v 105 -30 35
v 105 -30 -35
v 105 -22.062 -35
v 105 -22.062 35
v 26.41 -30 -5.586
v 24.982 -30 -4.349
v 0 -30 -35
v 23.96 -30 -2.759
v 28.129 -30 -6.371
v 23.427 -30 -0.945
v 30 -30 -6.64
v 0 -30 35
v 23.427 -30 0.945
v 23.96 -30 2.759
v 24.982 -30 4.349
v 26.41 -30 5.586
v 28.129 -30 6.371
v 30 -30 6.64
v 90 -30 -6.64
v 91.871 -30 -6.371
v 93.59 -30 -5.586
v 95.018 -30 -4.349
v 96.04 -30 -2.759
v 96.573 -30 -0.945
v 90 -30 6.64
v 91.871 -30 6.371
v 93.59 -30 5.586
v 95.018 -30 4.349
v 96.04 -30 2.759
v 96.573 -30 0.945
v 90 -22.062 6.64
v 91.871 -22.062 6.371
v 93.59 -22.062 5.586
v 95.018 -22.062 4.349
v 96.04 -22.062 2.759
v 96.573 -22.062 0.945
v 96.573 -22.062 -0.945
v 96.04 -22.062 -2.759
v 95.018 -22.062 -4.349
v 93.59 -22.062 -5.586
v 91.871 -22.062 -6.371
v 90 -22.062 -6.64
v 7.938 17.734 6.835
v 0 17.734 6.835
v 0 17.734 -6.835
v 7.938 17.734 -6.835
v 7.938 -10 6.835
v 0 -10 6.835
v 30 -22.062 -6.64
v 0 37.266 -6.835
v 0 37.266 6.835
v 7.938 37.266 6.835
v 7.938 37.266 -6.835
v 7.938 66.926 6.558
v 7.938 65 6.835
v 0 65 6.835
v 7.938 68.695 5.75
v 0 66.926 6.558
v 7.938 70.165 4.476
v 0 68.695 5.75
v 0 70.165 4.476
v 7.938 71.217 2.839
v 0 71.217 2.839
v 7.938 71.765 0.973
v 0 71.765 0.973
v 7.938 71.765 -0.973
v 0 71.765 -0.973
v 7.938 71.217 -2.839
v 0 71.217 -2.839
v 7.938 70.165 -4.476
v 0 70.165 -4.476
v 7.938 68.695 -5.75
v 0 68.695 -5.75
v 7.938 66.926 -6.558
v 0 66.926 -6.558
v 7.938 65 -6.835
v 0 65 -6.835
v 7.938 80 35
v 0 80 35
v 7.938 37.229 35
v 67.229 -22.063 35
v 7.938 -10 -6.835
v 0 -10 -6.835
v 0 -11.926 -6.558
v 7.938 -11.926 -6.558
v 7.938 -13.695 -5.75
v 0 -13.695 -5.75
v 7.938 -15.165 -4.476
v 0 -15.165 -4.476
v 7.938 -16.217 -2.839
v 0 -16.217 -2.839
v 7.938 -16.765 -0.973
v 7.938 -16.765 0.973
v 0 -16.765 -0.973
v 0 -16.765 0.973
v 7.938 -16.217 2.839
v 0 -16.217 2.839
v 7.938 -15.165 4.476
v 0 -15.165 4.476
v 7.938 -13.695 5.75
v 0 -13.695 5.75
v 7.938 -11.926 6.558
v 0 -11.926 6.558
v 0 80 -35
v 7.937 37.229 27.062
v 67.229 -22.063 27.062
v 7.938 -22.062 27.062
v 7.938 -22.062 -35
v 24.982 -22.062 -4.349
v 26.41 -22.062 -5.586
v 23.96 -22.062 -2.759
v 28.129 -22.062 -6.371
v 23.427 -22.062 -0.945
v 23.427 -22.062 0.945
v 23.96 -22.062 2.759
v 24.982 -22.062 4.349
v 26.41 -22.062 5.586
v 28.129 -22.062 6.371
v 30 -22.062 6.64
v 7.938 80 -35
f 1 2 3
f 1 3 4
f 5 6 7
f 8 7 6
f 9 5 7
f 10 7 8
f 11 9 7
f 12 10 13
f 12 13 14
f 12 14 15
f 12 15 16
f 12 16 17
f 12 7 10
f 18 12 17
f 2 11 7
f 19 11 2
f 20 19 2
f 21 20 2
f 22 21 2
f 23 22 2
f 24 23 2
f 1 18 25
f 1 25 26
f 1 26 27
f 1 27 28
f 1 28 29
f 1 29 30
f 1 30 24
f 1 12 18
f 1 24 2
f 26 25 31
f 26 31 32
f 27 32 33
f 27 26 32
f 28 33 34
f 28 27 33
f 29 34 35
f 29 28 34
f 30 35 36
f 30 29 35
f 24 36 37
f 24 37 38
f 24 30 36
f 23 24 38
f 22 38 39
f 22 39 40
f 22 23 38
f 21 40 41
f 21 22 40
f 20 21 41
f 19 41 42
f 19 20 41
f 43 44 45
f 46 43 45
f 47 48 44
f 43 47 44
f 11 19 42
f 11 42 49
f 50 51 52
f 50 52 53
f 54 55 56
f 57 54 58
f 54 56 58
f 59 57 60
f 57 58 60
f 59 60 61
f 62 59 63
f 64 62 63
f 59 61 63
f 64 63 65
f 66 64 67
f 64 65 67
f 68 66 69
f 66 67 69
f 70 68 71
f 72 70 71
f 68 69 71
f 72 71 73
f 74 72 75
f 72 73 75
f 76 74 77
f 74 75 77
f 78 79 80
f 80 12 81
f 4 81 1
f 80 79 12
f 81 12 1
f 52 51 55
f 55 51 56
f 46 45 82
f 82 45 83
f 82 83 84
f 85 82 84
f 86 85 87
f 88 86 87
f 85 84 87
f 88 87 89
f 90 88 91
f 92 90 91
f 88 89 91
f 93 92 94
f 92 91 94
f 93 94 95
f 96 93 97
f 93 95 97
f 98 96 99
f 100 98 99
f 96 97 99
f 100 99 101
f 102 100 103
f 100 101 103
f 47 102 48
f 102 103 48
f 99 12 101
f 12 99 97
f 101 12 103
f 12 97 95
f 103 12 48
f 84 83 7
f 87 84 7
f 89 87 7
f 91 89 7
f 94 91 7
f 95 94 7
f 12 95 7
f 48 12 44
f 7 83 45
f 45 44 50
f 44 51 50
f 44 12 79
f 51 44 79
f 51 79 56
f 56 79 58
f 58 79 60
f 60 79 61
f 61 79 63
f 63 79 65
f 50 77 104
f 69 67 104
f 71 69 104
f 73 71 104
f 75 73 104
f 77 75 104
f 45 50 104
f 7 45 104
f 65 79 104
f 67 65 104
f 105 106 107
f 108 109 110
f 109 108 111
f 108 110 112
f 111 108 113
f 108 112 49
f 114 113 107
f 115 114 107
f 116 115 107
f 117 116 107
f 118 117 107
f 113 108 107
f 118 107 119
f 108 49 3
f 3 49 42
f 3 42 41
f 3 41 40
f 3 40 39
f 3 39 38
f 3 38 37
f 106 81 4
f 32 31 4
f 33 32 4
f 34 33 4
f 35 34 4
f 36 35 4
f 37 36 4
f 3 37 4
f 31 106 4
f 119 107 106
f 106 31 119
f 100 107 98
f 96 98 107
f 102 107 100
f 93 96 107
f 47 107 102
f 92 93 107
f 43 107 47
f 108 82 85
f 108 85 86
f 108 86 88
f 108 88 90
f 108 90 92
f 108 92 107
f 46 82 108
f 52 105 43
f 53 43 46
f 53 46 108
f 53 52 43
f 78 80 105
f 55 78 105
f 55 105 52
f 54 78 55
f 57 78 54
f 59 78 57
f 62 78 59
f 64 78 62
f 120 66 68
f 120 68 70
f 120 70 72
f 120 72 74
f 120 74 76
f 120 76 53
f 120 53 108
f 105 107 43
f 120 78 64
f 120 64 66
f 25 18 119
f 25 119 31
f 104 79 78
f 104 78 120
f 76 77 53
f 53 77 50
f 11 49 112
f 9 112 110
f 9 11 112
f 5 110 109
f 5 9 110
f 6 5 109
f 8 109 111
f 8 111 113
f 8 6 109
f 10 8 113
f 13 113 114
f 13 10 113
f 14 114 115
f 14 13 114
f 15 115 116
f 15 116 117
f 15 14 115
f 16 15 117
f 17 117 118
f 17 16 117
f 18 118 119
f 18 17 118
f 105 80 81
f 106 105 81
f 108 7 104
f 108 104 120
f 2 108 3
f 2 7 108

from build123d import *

# Parameters (mm, degrees)
CROQUIS1_W              = 70
CROQUIS1_H              = 110
CROQUIS1_W_2            = 13.66965824
CROQUIS1_H_2            = 19.532598364
SALIENTE_EXTRUIR1_DEPTH = 7.9375
CROQUIS2_W              = 97.0625
CROQUIS2_H              = 70
SALIENTE_EXTRUIR2_DEPTH = 7.9375
SALIENTE_EXTRUIR3_DEPTH = 7.9375


with BuildPart() as part:
    # Croquis1 → Saliente-Extruir1 (new body)
    # profile 1 of 2: a face of its own
    with BuildSketch(Plane(origin=(0, 0, 0), x_dir=(0, 0, -1), z_dir=(1, 0, 0))):
        with Locations((0, 25)):
            Rectangle(CROQUIS1_W, CROQUIS1_H)
        with BuildLine():
            Line((6.83482912, 65), (6.83482912, -10))
            ThreePointArc((6.83482912, -10), (0, -16.83482912), (-6.83482912, -10))
            Line((-6.83482912, -10), (-6.83482912, 65))
            ThreePointArc((-6.83482912, 65), (0, 71.83482912), (6.83482912, 65))
        make_face(mode=Mode.SUBTRACT)
    # profile 2 of 2: a face of its own
    with BuildSketch(Plane(origin=(0, 0, 0), x_dir=(0, 0, -1), z_dir=(1, 0, 0))):
        with Locations((0, 27.5)):
            Rectangle(CROQUIS1_W_2, CROQUIS1_H_2)
    extrude(amount=SALIENTE_EXTRUIR1_DEPTH)

    # Croquis2 → Saliente-Extruir2 (add)
    with BuildSketch(Plane.XZ.offset(30)):
        with Locations((56.46875, 0)):
            Rectangle(CROQUIS2_W, CROQUIS2_H)
        with BuildLine():
            ThreePointArc((30, -6.640349162), (23.359650838, 0), (30, 6.640349162))
            Line((30, 6.640349162), (90, 6.640349162))
            ThreePointArc((90, 6.640349162), (96.640349162, 0), (90, -6.640349162))
            Line((90, -6.640349162), (30, -6.640349162))
        make_face(mode=Mode.SUBTRACT)
    extrude(amount=-SALIENTE_EXTRUIR2_DEPTH)

    # Croquis3 → Saliente-Extruir3 (add)
    with BuildSketch(Plane(origin=(0, 0, 35), x_dir=(-1, 0, 0), z_dir=(0, 0, -1))):
        Polygon((0, 45.166428926), (-75.166428926, -30), (0, -30), align=None)
    extrude(amount=SALIENTE_EXTRUIR3_DEPTH)


solid = part.part
